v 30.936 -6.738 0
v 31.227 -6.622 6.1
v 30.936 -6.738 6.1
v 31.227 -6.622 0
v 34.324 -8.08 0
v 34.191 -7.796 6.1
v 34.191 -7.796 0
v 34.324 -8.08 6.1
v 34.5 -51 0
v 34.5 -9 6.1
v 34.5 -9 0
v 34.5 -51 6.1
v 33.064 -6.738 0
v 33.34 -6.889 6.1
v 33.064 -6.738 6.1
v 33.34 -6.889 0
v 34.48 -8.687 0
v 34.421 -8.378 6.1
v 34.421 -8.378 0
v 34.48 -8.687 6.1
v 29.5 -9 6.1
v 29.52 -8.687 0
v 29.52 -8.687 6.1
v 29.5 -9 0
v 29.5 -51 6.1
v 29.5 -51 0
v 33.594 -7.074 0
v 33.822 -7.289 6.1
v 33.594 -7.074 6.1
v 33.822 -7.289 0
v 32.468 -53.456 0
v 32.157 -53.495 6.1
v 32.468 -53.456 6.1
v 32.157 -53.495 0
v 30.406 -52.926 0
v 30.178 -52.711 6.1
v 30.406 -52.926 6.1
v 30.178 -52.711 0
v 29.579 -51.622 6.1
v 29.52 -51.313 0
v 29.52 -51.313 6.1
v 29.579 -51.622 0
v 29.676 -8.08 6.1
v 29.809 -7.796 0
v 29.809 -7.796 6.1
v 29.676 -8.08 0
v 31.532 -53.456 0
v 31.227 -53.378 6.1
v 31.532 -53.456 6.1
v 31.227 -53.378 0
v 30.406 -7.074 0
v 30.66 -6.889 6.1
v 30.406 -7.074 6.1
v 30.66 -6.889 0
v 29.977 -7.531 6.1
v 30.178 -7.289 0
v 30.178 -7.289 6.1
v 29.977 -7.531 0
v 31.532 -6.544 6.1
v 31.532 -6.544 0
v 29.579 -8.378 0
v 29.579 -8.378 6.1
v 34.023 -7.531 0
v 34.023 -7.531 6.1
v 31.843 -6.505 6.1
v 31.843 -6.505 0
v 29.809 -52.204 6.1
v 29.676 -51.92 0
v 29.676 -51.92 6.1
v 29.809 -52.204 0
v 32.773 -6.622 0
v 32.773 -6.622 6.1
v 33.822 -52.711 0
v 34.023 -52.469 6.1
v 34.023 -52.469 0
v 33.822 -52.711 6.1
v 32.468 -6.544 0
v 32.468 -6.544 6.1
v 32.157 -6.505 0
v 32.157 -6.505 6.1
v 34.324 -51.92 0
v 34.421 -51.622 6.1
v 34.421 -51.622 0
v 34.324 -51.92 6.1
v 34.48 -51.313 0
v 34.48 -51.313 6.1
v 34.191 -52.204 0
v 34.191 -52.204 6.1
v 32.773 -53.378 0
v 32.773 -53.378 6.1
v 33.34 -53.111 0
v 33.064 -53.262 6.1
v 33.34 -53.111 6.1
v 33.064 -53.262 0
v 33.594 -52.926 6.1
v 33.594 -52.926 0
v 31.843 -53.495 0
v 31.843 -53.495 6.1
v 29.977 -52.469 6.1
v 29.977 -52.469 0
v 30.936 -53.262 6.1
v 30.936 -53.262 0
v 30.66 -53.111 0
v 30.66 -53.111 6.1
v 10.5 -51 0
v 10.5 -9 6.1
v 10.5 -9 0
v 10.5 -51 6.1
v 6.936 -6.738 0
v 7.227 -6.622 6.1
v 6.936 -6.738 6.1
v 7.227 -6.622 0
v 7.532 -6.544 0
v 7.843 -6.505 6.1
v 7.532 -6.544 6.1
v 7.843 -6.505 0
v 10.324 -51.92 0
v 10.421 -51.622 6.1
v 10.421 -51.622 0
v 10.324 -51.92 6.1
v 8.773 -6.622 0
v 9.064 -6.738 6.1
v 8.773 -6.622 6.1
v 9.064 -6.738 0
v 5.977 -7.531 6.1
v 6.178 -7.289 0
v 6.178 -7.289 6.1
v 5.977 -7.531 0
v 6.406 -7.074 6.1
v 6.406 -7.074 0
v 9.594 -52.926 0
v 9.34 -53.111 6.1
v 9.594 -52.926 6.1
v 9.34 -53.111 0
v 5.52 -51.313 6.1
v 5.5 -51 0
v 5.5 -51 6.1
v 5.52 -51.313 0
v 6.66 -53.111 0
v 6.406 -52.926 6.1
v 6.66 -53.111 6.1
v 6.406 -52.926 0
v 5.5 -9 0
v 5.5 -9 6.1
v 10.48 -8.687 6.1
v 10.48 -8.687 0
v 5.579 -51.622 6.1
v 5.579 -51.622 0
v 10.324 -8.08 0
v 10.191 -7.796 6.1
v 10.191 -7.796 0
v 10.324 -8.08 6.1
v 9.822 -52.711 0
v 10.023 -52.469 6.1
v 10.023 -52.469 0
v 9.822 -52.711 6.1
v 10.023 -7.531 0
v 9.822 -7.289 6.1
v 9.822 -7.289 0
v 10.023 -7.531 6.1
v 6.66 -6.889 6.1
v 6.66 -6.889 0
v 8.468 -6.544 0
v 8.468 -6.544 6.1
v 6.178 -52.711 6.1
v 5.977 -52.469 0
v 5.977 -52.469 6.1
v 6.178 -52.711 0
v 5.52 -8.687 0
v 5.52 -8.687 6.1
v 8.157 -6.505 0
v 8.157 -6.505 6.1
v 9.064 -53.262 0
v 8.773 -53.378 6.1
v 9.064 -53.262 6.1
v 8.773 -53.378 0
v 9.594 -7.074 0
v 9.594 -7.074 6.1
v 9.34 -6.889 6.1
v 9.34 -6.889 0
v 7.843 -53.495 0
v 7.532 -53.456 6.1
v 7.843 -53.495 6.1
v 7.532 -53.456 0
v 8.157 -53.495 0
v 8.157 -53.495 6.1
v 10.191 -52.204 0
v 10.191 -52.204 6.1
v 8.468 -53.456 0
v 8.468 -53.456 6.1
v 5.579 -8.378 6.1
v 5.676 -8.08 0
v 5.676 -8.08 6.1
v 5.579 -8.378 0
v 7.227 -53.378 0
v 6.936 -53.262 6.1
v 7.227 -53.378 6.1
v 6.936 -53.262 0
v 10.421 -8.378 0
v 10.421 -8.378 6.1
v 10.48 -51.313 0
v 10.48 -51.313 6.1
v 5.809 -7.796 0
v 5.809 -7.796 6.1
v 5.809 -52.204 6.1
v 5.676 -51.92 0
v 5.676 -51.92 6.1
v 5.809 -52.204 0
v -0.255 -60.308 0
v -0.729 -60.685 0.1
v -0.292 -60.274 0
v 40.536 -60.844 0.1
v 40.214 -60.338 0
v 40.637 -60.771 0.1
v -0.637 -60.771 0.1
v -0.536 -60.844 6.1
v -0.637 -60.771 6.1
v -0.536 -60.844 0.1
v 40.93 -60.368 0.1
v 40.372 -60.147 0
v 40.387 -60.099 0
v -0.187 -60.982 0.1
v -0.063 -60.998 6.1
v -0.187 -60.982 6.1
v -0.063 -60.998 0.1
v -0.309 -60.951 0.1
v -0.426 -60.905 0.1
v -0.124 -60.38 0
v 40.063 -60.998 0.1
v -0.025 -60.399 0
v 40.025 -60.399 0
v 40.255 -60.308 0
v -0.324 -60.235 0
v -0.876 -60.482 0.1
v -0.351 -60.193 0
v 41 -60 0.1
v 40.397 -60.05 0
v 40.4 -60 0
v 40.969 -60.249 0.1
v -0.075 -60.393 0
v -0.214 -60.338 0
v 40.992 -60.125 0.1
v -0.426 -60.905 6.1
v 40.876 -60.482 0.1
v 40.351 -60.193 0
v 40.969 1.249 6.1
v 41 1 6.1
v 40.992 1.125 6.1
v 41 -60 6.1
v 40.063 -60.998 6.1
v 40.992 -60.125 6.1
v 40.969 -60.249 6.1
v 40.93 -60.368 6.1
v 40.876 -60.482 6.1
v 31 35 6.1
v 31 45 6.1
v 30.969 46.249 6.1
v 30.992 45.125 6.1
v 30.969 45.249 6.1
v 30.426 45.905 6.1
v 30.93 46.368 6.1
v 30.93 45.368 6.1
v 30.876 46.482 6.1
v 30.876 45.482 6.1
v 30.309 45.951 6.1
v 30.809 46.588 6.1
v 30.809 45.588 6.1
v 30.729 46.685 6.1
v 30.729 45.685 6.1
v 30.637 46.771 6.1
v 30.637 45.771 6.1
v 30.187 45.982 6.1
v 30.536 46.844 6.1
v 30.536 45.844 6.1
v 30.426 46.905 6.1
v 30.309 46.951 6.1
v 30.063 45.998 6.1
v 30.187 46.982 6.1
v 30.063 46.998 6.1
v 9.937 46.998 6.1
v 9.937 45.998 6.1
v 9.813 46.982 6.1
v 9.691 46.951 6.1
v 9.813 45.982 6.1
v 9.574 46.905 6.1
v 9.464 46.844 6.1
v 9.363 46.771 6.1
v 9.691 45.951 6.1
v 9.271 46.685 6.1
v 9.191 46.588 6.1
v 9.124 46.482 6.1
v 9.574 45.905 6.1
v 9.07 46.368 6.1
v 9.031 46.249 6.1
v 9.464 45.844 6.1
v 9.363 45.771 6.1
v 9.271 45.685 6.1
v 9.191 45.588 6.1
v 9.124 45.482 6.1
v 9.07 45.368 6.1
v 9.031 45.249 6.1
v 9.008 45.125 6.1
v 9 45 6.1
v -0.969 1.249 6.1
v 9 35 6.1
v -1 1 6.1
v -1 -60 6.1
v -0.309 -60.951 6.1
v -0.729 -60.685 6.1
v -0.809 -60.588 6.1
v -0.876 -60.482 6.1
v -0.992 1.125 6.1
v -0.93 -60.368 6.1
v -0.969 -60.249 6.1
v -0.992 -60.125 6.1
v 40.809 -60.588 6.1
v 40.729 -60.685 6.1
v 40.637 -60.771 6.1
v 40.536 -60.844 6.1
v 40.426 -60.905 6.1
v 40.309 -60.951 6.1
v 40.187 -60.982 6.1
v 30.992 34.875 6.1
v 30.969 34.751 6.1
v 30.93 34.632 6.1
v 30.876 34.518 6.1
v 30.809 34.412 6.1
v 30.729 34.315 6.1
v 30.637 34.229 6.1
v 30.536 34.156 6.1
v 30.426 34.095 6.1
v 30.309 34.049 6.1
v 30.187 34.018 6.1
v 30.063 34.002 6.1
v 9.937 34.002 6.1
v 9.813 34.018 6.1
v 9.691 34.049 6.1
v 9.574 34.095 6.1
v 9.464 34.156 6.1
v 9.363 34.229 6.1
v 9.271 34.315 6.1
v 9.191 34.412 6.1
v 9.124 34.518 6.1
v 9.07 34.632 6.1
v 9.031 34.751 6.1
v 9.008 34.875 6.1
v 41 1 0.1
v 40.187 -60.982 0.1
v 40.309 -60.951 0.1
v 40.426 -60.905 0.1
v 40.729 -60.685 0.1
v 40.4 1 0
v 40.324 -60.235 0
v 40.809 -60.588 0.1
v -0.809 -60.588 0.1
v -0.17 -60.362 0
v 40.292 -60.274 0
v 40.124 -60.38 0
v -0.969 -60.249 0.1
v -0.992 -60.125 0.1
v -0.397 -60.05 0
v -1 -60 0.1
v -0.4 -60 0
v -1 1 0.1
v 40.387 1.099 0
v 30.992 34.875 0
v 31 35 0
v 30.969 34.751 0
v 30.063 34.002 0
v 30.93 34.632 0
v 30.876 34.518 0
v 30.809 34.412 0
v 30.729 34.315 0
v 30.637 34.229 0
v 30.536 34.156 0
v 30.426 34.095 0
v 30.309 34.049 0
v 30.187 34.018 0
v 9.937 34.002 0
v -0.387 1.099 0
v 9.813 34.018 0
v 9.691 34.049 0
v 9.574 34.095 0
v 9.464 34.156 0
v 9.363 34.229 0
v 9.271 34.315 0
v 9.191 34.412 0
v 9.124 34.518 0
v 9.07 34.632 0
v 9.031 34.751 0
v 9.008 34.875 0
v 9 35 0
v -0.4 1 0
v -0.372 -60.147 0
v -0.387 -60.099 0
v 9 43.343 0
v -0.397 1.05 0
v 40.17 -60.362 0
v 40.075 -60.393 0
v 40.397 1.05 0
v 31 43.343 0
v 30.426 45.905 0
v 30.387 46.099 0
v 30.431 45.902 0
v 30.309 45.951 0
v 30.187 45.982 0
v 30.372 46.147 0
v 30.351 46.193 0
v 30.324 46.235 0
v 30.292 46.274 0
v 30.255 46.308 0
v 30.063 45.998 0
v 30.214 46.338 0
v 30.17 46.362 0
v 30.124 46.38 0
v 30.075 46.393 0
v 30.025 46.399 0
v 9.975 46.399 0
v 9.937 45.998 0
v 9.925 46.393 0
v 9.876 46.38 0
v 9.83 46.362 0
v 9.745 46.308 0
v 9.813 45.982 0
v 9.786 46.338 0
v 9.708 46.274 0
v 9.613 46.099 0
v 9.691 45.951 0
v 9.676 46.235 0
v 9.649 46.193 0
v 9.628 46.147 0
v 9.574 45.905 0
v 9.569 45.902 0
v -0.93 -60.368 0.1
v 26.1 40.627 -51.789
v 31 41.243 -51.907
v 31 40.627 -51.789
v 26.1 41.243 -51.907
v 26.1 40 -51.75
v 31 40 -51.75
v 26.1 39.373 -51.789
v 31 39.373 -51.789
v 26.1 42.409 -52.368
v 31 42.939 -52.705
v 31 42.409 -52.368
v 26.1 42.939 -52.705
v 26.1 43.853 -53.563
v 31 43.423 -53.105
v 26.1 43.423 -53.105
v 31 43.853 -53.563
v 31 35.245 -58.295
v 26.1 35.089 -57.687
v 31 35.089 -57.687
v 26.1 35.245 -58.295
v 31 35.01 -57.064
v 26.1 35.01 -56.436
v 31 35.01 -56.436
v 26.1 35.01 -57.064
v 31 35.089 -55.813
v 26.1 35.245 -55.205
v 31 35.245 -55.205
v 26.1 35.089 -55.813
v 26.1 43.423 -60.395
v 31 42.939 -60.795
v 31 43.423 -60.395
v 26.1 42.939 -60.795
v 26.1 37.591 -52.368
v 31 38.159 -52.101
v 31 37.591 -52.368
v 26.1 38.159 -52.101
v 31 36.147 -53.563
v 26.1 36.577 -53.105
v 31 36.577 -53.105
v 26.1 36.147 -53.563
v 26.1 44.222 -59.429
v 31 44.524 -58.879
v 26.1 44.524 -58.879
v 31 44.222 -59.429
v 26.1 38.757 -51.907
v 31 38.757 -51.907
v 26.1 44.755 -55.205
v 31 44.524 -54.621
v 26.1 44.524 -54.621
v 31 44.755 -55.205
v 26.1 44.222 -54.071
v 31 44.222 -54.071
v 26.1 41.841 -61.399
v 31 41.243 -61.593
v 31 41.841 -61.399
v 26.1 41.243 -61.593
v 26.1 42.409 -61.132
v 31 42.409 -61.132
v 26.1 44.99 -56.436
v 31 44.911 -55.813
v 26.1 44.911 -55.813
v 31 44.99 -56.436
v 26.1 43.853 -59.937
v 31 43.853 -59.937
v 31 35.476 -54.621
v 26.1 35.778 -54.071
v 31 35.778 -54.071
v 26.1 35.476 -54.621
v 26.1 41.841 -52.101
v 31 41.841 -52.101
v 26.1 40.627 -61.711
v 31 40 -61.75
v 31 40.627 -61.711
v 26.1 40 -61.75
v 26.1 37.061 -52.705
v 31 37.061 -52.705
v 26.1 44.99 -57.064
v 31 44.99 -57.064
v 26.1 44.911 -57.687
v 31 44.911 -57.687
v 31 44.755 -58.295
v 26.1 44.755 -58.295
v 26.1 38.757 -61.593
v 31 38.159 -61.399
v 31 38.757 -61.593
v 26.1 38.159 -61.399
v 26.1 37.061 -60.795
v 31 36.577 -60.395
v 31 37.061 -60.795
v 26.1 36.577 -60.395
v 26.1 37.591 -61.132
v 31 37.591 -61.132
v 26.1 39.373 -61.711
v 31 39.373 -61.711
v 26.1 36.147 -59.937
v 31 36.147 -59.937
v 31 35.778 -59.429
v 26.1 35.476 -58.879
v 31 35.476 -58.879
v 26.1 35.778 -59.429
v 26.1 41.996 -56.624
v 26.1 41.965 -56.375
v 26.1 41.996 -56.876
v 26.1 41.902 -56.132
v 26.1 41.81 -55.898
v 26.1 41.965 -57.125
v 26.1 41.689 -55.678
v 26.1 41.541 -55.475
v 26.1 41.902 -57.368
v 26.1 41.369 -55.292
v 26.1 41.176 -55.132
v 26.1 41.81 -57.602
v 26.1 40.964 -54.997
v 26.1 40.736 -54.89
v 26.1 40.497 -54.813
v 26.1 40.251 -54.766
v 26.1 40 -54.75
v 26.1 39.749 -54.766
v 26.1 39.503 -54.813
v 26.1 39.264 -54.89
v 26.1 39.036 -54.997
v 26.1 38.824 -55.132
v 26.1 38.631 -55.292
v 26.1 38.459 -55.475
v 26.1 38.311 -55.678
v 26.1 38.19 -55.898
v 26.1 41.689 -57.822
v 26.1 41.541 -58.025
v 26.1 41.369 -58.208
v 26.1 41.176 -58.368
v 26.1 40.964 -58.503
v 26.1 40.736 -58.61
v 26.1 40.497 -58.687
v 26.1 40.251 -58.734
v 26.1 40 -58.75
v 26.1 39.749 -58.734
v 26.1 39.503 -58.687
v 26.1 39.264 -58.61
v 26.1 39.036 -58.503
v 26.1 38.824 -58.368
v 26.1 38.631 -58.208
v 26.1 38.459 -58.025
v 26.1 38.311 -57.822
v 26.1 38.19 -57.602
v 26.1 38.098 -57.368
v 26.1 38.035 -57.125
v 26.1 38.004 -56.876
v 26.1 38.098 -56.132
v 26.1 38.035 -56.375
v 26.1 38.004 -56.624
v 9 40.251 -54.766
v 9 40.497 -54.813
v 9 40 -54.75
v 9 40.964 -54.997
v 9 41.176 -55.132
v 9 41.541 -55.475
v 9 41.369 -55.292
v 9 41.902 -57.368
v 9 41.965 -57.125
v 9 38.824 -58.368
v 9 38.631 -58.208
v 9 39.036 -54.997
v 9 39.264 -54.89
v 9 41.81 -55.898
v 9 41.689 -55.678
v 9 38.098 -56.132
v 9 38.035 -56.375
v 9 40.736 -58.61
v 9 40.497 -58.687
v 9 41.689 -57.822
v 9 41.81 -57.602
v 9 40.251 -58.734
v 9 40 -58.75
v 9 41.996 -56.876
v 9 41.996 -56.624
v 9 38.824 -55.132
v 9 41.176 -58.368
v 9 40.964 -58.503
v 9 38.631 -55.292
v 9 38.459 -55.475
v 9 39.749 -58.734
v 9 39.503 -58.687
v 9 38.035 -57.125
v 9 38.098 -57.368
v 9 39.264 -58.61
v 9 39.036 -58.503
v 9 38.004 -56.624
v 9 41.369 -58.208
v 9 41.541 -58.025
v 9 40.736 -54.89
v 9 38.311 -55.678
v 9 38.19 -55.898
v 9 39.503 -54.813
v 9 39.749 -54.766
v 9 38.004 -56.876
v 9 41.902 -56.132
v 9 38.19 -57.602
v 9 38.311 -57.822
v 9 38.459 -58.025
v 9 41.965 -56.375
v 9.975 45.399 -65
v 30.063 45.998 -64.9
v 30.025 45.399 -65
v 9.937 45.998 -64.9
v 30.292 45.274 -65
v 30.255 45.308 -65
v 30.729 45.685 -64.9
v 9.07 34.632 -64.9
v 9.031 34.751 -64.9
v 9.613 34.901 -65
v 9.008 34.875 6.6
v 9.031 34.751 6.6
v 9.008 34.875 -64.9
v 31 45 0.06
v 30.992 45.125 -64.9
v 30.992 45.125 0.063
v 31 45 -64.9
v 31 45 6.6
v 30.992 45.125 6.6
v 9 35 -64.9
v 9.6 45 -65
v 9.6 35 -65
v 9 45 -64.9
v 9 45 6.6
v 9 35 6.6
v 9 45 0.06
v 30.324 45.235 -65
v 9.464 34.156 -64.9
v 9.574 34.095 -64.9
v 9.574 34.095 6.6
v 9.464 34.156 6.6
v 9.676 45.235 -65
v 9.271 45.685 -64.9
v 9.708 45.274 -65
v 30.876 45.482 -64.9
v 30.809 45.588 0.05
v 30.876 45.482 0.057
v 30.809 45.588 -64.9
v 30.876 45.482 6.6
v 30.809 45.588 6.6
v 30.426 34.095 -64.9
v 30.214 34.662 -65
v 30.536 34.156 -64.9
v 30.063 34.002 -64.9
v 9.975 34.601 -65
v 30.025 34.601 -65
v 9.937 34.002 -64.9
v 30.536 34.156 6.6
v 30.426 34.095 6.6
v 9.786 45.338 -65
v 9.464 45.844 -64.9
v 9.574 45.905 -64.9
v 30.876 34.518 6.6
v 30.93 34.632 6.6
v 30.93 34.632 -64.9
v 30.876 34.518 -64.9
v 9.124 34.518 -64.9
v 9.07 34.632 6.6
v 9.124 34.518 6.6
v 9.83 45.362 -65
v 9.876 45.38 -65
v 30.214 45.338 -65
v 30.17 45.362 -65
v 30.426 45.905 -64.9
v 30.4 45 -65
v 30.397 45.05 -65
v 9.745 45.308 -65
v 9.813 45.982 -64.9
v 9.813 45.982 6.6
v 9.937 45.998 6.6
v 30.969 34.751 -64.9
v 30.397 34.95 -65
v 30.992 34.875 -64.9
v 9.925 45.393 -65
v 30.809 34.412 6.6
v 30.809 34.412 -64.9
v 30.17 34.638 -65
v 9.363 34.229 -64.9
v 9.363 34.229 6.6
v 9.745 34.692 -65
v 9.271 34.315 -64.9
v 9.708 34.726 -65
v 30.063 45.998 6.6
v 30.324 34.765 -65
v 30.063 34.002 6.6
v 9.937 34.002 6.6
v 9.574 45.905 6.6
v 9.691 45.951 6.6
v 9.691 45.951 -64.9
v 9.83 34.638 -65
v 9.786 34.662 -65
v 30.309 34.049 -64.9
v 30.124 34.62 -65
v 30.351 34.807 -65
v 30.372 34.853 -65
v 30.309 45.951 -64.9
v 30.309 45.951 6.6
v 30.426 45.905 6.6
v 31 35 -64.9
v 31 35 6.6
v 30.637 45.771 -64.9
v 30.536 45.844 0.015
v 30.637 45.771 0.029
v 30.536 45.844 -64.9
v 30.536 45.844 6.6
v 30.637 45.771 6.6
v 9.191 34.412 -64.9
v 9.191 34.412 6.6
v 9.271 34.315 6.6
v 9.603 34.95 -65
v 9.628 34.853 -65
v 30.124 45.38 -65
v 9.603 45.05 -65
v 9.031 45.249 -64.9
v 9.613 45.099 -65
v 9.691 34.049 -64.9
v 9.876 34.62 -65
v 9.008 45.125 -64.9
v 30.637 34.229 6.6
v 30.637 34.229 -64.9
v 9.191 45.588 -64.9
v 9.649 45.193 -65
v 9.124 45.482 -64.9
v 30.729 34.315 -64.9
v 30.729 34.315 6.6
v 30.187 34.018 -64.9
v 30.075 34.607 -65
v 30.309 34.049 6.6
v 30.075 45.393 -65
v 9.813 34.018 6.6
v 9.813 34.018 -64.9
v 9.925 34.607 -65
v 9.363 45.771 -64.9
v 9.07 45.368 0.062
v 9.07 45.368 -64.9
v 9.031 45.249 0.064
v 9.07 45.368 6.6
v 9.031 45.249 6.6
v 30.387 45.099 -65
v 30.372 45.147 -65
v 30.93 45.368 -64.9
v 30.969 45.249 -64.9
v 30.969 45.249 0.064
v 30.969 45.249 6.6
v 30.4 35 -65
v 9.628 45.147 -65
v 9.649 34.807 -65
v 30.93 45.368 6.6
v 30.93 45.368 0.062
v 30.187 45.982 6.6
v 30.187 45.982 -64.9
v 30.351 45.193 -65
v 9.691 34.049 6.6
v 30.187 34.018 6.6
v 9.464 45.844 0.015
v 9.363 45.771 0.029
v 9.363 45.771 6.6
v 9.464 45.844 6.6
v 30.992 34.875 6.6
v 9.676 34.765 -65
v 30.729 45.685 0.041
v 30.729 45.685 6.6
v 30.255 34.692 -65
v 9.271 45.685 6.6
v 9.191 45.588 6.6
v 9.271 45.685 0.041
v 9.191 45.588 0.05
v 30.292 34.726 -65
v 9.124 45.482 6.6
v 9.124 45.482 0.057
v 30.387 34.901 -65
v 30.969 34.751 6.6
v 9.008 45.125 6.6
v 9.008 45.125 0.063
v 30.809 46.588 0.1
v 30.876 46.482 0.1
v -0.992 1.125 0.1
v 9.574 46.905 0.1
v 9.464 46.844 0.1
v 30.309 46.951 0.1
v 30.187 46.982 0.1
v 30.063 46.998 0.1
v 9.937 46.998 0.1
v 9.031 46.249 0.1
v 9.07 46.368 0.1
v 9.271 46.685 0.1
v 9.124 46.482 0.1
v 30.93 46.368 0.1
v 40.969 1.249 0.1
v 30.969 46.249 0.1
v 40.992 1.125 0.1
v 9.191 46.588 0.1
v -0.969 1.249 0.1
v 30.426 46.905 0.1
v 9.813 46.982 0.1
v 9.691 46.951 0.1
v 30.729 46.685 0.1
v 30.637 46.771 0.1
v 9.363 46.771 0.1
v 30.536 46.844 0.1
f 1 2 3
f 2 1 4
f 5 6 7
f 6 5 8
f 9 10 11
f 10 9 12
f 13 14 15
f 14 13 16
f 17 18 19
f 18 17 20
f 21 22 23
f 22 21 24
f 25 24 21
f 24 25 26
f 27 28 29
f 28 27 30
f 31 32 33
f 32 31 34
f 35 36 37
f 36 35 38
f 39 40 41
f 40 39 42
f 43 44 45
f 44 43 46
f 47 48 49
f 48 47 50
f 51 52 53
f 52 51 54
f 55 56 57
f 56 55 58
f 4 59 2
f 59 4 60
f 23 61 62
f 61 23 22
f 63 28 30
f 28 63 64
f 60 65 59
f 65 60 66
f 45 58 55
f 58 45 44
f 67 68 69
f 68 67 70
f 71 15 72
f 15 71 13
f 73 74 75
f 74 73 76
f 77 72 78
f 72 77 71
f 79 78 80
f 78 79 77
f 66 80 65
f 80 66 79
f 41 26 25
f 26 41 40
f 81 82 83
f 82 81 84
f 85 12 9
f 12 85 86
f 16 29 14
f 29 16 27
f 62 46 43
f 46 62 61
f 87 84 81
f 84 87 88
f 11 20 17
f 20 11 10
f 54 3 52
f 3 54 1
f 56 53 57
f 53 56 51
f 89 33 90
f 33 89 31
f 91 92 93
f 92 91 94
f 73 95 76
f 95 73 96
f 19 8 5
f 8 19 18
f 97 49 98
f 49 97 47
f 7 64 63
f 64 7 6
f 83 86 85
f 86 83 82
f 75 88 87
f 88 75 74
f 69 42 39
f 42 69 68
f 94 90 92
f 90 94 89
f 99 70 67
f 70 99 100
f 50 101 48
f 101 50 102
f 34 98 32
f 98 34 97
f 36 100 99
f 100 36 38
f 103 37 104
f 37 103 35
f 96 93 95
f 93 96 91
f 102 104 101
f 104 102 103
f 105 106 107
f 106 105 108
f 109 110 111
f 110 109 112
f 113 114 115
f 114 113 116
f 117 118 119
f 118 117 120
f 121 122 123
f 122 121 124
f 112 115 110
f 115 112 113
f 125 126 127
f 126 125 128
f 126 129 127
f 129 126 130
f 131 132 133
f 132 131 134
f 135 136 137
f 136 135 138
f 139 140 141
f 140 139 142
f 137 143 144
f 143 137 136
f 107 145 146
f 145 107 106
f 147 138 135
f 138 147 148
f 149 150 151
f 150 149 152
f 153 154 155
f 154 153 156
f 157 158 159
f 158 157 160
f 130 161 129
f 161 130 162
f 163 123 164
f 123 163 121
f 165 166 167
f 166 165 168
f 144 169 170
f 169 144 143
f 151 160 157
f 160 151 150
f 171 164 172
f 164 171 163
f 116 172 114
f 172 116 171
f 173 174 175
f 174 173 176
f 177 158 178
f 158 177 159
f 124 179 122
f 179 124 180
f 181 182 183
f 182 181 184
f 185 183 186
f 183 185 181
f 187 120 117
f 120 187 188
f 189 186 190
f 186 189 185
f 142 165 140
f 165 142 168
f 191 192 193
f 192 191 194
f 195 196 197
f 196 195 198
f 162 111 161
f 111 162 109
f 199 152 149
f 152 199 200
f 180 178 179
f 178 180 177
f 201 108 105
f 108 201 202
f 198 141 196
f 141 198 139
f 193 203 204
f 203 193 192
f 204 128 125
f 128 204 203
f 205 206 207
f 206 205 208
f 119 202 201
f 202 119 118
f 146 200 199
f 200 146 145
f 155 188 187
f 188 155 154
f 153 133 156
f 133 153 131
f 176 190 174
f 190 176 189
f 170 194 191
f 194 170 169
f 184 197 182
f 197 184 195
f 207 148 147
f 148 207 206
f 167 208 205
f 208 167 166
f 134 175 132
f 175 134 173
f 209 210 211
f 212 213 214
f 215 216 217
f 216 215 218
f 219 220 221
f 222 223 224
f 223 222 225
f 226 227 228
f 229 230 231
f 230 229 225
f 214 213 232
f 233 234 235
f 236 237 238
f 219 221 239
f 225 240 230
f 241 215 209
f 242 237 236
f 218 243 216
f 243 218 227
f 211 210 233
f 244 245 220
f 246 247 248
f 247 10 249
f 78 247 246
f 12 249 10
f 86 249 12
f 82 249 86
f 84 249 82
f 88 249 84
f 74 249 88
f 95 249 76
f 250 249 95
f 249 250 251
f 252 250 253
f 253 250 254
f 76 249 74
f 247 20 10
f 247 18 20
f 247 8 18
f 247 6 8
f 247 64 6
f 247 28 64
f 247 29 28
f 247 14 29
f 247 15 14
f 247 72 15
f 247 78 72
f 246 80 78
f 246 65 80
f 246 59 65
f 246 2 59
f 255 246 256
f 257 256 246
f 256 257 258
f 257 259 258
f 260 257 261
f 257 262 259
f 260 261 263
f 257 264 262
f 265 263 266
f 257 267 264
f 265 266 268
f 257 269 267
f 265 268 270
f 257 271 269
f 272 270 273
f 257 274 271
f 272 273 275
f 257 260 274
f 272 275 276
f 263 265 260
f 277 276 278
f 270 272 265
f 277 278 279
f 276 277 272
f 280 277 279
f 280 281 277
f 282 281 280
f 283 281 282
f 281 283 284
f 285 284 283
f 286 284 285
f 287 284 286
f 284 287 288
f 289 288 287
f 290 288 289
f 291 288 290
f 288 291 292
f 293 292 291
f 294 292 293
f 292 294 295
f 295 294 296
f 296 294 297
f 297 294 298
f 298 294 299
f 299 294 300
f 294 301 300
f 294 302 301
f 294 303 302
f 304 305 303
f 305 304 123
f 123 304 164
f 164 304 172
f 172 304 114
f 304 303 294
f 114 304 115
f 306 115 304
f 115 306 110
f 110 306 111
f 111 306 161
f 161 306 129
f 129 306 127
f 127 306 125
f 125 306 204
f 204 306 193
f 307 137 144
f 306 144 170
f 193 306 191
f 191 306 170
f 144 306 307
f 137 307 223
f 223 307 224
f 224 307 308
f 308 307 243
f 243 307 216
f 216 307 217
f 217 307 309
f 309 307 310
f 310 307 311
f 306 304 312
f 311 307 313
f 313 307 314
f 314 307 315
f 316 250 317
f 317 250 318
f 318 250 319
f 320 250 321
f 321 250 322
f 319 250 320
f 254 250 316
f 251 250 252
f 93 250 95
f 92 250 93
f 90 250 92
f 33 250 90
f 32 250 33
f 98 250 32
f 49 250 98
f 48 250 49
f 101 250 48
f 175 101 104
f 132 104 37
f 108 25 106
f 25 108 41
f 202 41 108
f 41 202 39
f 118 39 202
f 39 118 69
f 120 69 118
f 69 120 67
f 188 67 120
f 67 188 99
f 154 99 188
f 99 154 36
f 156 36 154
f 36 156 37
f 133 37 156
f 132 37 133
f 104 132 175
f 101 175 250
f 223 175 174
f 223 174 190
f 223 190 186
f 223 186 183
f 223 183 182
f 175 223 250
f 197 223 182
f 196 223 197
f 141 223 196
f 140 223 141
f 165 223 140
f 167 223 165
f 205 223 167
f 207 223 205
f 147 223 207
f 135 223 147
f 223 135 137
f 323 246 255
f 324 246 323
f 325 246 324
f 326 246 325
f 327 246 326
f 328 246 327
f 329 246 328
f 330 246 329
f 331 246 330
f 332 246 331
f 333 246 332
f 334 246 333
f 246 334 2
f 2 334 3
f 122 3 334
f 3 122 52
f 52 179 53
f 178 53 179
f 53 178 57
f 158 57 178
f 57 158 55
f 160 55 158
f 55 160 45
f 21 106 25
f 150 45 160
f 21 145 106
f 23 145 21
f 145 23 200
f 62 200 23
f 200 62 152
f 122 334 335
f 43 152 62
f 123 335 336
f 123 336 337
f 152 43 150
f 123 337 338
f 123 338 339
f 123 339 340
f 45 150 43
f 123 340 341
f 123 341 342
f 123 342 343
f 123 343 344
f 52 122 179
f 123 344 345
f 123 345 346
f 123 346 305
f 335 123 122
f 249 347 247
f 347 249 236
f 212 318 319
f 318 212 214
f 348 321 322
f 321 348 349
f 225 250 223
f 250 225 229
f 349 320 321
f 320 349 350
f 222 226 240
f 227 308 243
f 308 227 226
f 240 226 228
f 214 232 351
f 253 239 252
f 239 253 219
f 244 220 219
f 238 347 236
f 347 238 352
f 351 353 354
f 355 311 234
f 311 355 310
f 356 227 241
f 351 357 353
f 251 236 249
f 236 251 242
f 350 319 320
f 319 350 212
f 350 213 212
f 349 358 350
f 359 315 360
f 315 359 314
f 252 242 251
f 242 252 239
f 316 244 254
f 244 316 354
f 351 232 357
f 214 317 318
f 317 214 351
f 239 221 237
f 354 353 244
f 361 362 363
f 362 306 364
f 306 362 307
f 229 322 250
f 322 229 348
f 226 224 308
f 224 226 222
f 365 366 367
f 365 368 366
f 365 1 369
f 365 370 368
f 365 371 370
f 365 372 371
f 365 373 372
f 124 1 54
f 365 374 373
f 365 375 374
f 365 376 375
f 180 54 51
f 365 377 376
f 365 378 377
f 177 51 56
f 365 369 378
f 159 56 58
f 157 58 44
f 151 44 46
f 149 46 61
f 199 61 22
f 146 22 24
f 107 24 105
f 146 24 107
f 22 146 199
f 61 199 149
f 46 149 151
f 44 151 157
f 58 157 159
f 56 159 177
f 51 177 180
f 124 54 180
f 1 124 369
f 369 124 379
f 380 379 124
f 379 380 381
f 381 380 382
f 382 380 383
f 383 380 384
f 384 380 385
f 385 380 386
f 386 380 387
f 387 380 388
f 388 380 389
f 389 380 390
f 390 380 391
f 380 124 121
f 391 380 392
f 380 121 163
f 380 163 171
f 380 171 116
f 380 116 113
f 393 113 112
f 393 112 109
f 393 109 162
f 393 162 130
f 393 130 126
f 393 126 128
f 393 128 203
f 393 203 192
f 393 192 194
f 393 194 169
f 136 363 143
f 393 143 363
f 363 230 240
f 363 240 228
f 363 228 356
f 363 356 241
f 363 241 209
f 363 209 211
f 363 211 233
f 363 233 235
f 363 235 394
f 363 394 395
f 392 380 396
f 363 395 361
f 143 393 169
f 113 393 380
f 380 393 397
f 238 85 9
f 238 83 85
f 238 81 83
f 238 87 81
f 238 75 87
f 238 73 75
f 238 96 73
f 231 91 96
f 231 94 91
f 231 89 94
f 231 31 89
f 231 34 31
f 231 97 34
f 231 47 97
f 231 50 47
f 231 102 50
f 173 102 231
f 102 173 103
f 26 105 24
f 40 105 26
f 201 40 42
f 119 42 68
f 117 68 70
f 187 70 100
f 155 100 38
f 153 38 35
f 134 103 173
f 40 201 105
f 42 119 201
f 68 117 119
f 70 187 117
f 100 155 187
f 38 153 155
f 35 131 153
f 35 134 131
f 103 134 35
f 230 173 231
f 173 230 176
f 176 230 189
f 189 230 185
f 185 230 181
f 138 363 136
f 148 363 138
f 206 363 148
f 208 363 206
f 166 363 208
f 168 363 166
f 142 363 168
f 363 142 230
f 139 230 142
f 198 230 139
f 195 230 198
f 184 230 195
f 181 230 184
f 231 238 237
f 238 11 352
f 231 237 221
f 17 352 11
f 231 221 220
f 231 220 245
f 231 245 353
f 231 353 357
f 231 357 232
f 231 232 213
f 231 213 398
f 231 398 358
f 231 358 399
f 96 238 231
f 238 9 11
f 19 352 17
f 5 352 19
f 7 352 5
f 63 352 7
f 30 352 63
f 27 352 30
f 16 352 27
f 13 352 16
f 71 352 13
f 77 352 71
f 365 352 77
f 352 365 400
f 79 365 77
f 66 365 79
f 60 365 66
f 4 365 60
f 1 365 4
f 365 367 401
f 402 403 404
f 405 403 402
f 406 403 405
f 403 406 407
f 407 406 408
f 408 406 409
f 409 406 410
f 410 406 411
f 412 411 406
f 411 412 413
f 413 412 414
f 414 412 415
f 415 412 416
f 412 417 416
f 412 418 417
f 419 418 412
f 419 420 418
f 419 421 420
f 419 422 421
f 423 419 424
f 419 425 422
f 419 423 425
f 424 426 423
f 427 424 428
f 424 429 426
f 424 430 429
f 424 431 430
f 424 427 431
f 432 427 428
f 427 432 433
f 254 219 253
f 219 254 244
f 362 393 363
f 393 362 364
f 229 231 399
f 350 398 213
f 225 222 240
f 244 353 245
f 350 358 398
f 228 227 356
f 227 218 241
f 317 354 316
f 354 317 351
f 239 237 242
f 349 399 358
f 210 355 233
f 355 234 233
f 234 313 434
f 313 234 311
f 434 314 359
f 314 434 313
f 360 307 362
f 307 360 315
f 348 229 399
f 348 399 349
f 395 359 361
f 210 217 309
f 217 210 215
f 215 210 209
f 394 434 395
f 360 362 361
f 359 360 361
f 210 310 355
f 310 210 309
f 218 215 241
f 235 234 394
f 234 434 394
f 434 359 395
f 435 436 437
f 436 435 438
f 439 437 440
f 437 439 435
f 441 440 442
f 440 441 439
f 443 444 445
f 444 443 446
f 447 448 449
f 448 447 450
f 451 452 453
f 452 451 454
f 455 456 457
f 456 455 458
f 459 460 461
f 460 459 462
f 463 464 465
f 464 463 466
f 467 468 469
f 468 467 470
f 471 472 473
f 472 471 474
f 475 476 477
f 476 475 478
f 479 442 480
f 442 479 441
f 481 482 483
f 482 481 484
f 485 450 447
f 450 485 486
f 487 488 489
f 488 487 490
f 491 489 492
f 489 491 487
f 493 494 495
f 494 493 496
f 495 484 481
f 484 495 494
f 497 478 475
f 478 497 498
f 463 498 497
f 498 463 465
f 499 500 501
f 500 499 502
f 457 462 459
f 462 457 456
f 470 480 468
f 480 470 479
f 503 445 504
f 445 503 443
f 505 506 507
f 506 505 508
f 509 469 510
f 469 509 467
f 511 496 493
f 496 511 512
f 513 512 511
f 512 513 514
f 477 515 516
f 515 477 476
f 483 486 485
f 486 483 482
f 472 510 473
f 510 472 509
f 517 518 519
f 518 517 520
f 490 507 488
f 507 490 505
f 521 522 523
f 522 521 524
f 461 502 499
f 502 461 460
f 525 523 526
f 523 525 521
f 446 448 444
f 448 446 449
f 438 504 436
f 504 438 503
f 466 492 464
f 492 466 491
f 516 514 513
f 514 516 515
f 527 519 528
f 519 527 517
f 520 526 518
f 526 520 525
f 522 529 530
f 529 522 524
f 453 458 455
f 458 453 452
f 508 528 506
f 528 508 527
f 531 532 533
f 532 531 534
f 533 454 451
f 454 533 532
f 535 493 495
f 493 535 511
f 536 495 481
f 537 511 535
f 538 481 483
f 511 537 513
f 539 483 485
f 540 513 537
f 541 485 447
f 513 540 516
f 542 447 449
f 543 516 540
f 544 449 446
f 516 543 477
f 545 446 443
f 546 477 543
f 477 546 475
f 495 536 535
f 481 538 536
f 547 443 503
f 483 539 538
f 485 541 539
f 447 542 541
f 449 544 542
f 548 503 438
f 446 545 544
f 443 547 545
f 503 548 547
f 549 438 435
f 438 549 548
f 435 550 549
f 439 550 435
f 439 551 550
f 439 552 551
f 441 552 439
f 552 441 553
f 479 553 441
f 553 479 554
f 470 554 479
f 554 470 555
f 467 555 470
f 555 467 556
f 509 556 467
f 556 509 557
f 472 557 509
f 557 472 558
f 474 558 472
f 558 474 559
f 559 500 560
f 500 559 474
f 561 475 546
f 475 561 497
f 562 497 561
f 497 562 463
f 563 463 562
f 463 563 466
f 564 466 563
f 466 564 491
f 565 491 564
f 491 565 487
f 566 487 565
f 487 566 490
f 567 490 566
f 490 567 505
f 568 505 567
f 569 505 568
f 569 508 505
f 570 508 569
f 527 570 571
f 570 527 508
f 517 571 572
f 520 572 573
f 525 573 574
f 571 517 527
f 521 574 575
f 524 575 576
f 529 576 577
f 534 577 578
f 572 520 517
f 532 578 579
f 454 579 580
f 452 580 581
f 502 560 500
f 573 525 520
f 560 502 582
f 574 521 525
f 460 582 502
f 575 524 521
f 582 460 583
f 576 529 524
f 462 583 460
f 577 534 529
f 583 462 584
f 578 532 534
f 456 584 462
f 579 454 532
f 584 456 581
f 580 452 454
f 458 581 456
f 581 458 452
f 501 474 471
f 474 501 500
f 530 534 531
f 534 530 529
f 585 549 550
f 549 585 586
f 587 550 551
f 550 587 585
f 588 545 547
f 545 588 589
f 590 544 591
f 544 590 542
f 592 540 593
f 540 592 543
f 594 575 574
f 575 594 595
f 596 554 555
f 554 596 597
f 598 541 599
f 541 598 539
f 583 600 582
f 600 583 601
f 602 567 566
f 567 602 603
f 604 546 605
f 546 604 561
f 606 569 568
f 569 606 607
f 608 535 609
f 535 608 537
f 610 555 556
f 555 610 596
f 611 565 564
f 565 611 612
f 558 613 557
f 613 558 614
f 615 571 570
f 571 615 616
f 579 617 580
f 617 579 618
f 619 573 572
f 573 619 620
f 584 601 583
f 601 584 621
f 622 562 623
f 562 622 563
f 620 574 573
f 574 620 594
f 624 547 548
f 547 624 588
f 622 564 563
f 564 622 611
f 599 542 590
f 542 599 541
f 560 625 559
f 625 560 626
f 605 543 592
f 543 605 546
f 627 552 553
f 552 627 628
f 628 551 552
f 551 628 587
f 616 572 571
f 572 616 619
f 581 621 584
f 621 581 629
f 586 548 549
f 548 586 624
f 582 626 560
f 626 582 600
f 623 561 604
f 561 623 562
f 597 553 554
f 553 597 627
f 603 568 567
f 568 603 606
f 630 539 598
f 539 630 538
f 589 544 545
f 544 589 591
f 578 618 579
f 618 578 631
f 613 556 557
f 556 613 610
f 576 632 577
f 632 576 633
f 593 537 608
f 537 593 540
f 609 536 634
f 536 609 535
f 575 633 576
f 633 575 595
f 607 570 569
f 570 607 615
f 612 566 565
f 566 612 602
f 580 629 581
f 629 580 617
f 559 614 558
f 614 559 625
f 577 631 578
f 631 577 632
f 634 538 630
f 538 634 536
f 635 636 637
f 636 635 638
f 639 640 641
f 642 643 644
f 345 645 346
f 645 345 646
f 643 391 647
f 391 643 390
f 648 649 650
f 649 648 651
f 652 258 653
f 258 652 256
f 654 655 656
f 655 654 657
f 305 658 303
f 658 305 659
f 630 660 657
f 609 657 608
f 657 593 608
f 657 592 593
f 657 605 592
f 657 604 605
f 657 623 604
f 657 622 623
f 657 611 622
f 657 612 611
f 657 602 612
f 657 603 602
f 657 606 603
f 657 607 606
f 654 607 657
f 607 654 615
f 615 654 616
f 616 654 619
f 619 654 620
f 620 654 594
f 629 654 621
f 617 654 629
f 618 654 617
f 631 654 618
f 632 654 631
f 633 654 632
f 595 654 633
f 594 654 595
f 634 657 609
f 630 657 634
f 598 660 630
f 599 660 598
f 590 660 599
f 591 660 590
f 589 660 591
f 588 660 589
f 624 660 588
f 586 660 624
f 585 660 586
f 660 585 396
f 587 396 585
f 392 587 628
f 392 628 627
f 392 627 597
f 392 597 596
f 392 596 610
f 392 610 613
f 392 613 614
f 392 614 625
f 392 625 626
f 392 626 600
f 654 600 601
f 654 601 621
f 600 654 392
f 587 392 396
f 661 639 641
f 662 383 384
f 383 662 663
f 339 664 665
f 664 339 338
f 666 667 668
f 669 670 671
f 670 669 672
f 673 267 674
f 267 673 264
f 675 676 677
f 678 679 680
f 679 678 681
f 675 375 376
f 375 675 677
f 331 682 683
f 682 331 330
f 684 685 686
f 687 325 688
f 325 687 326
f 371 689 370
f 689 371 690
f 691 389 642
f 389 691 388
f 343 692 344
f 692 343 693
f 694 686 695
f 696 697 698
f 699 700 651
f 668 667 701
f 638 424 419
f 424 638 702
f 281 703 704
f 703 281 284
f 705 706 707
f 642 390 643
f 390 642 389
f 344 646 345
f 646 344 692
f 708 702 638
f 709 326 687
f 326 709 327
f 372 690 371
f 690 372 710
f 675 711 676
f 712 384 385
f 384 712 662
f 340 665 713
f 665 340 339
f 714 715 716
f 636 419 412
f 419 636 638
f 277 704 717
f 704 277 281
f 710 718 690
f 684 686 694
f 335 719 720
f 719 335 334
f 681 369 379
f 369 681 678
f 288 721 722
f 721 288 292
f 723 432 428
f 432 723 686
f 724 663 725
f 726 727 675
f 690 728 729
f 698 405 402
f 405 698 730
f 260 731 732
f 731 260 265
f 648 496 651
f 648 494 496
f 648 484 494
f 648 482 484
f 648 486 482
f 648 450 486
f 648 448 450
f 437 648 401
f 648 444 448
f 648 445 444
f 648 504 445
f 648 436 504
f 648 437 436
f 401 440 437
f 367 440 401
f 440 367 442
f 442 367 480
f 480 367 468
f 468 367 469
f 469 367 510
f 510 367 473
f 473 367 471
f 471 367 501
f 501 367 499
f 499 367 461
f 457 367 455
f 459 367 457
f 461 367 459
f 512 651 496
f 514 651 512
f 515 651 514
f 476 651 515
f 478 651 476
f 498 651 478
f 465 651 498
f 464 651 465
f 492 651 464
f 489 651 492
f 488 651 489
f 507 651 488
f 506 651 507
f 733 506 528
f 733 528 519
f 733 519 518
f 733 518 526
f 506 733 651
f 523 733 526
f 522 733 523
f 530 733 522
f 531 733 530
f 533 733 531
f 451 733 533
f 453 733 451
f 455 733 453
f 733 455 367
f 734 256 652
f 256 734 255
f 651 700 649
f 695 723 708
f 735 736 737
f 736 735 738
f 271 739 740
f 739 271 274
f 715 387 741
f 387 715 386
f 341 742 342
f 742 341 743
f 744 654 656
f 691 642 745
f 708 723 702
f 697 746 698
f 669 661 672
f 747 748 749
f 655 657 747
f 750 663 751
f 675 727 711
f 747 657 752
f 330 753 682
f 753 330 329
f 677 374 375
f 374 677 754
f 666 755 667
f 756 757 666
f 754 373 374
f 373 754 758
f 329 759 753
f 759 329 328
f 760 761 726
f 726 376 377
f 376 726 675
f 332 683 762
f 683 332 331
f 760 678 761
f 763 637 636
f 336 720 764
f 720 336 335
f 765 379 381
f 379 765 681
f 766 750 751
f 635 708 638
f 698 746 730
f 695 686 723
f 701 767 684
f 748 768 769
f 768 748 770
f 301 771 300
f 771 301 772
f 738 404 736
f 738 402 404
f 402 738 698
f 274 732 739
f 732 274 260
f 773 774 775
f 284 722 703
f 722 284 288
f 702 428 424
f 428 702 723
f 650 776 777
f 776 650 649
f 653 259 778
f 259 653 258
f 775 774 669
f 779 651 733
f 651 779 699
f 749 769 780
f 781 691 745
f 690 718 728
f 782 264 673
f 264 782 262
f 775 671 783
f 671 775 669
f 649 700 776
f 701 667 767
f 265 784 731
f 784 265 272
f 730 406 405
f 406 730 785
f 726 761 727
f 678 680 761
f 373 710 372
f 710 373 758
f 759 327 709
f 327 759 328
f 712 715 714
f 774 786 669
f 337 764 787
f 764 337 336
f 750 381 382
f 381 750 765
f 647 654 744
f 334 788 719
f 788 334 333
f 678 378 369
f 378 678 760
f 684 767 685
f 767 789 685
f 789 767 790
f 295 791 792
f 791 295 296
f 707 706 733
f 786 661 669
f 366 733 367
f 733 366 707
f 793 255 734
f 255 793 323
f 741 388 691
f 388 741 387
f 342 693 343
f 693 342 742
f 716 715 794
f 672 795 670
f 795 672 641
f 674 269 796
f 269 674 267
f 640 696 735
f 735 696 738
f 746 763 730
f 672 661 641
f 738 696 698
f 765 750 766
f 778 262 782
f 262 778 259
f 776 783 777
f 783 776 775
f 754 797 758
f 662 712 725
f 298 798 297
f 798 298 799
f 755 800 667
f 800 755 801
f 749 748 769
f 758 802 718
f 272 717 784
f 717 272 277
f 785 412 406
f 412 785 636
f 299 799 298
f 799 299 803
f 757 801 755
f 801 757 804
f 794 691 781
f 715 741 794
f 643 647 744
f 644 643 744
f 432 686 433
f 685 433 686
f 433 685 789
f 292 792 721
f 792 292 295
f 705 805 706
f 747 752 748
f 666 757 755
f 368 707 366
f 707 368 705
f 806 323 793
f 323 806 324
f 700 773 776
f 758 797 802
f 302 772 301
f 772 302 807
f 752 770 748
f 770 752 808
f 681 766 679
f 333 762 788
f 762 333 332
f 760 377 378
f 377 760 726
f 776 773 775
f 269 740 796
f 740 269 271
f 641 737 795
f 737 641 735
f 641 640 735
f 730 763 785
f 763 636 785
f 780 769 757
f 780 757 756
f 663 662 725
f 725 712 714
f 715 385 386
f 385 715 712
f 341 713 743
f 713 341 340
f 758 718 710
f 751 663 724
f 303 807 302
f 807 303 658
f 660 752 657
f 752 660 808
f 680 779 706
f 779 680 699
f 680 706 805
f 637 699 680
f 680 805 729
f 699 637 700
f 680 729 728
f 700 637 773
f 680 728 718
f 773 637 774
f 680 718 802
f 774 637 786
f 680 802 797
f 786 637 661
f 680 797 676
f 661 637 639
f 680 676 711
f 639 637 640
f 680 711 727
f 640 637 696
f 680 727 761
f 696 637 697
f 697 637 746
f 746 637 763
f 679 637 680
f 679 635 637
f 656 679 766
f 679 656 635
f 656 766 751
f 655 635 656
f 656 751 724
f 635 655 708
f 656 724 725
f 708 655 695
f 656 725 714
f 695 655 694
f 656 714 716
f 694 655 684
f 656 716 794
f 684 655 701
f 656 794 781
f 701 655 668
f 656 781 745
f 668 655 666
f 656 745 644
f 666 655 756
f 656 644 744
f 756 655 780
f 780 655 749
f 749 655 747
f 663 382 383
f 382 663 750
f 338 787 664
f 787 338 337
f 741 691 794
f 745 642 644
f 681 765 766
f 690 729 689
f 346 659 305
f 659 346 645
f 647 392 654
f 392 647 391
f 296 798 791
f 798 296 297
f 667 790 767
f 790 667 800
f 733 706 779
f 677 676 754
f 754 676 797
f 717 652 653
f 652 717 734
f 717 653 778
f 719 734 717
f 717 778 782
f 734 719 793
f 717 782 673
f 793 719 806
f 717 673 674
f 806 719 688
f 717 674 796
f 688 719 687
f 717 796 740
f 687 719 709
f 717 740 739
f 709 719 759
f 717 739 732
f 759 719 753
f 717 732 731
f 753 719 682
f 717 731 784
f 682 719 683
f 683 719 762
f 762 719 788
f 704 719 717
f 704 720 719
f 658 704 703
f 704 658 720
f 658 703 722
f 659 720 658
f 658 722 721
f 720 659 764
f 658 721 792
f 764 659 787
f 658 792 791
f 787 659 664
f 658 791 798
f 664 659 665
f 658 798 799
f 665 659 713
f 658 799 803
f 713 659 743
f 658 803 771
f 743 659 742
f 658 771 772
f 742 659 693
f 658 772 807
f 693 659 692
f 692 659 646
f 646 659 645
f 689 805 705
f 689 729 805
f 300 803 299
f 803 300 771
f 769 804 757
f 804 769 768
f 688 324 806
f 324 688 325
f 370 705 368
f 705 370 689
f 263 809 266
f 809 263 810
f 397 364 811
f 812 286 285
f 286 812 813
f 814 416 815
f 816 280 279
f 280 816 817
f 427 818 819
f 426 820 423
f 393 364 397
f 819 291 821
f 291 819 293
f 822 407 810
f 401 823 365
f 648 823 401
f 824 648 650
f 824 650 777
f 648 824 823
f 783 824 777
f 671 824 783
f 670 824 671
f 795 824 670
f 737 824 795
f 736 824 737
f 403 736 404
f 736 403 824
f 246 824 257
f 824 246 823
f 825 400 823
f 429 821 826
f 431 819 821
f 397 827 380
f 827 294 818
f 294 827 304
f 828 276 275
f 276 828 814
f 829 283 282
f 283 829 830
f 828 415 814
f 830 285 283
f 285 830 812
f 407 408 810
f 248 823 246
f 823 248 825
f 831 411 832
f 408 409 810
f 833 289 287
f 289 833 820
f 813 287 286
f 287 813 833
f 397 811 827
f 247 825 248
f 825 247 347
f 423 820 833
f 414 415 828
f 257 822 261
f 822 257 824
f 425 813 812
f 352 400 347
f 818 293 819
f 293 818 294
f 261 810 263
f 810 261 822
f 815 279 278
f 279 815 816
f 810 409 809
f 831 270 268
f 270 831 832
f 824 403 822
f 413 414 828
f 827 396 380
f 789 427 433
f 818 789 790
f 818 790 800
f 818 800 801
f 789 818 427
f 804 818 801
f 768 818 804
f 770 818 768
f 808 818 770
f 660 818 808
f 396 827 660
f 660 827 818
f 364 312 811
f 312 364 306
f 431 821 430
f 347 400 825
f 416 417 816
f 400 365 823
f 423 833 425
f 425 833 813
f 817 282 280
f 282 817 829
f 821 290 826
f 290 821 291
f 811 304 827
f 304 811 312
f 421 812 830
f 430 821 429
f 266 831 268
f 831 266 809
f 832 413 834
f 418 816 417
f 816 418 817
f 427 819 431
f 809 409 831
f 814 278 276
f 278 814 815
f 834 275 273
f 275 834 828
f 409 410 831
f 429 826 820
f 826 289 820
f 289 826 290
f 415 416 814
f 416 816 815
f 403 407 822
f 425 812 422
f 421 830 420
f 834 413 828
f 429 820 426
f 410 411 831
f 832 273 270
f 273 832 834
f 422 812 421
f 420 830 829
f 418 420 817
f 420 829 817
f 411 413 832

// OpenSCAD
// file: util.scad
module rounded_cube(c=[1,1,1], r=0.1, h=0.4) {
    minkowski(){
      cube(c);
      cylinder(r,h);
    }
}

module half_cylinder(h=1, r=1) {
 intersection() {
     translate([0, -r, 0]) cube([r*2,r*2,h]);
     cylinder(r=r, h=h);
 }   
}

module halfSphere(r=1) {
 intersection() {
     translate([0, -r, -r]) cube([r*2,r*2,r*2]);
     sphere(r=r);
 }   
}

module pin(h=1) {
    hull(){
        cylinder(h=0.1,r=h/2);
        translate([0,0,h]) sphere(r=0.1);
    }
}

module hollow_cylinder(h=1, r=1, shell=0.1) {
    s = 1 - shell;
    difference() {
        cylinder(h=h,r=r);
        translate([0,0,-0.5]) cylinder(h=h+1,r=r*s);
    }
}

module cube_minus_sphere(size=1) {
    difference() {
       translate([-size/2,0.1,-size/2]) cube([size,size/2,size]);
       rotate([0,0,90]) halfSphere(r=size/2);
    }
}

module curve_cube(c=[1,1,1], curve=0.5) {
    difference() {
        rounded_cube(c);
        scale([1, 1, curve]) 
            translate([-1.5,c[1]/2,-c[1]/8]) 
                rotate([0,90,0]) 
                    cylinder(h=c[0]+3,r=c[1]/1.8);
    }    
}
module hook(h=5, d=3) {
    $fn=100;
    cylinder(h,d=d);
    translate([0,0,h]) sphere(d=d);
    
}

module cone(startDia=5, endDia=1, h=5) {
    $fn=200;
    hull() {
        cylinder(h=0.1, d=startDia);
        translate([0,0,endDia]) cylinder(h, d=endDia);
    }
}


module flexScrewHole(screwLength=10, screwDia=5, stretch=10, center=true ) {
    centerX = center ? -stretch/2 : 0;
    translate([centerX,0,0]){
        hull() {
            cylinder(h=screwLength, d=screwDia);
            translate([stretch,0,0]) cylinder(h=screwLength, d=screwDia);
        }
    }
}

module nut() {
    $fn=6;
    cylinder(d=TC_SCREW_NUT_DIA, h=TC_SCREW_NUT_HEIGHT);   
}

module hollow_rounded_cube(c=[1,1,1], shell=2.5, center=true) {
    //center
    centerX = center ? -c[0]/2 : 0;
    centerY = center ? -c[1]/2 : 0;
    translate([centerX,centerY, 0]) {
    
    difference() { 
        rounded_cube(c,0.1, 0.4);
        //inner
        translate([shell/2,shell/2,-.1]) {
            rounded_cube([c[0]-shell,c[1]-shell,c[2]+1],0.1, 0.4);
        }
    }
}
}

module triangle(size=100, height=10) {
 linear_extrude(height=height) polygon(points=[[0,0],[size,0],[0,size]], paths=[[0,1,2]]);
}
// file: startup.scad
include <util.scad>;

$fn =50;

//Aluminuim profile 3030
ALUMINUM_SIZE=30;

// carraige mount
CARRAGE_MOUNT_X=35;
CARRAGE_MOUNT_Y=65;
CARRAGE_MOUNT_Z=7;
TOOL_CHANGER_Z=7;

//size
CMS =
[CARRAGE_MOUNT_X,
CARRAGE_MOUNT_Y,
CARRAGE_MOUNT_Z];

// tool changer
toolChangerSize = 
[CARRAGE_MOUNT_X,
CARRAGE_MOUNT_Y,
TOOL_CHANGER_Z];

// tool catcher
TC_BASE_X=ALUMINUM_SIZE;
TC_BASE_Y=5;
TC_BASE_Z=20;
TC_BASE=[TC_BASE_X,TC_BASE_Y,TC_BASE_Z];


//locking in location small rods
RODS_HEIGHT=9;   // real heigt is 12
RODS_DIA=3.5;
RODS_FROM_X_FRONT=6;
RODS_FROM_Y_FRONT=20;
RODS_DISTANCE_FRONT=24;

// HOOKS
HOOKS_HEIGT=6;
HOOKS_DIA=6;

//magnets
MAGNET_DIA=12.5;
MAGNET_HEIGHT=5.5;
MAGNET_DISTANCE=30;

//new magnets
MAGNET_NEW_DIA=20;
MAGNET_NEW_HEIGHT=6;

//Brass Knurl screw
BRASS_KNURL_SCREW_DIA=5;
BRASS_KNURL_SCREW_HEIGHT=5;

//V6 HOT END
v6_DIA=16;
v6_DIA_HEIGHT_DOWN=3;
v6_DIA_HEIGHT_UP=3.7;
v6_INNER_DIA=12;
v6_INNER_HEIGHT=6;

v6_MOUNT_HEIGHT=v6_DIA_HEIGHT_DOWN + v6_INNER_HEIGHT + v6_DIA_HEIGHT_UP - .2;
v6_MOUNT_WIDTH=20;

v6_SECOND_PART_WIDTH=11;

//tool change
TC_SCREW_DISTANCE = 55;
TC_SCREW_LENGTH = 25;
TC_SCREW_HEAD_HEIGHT = 5;
TC_SCREW_HEAD_DIA = 10;
TC_SCREW_DIA = 4;

//nut 
TC_SCREW_NUT_DIA = 8;
TC_SCREW_NUT_HEIGHT = 4;


//tool catcher
TOOL_CATHCER_SCREWS_DISTANCE = ALUMINUM_SIZE/2;

//plastic tie 
PLASTIC_TIE_HEIGHT = 2.2;
PLASTIC_TIE_DEPTH = 3;

//fan mount
FAN_MOUNT_DISTANCE=20;
FAN_MOUNT_TUBE_DIA=5;


module toolChangeScrew() {
//top
cylinder (h=TC_SCREW_HEAD_HEIGHT, d=TC_SCREW_HEAD_DIA);
//body
translate([0,0,TC_SCREW_HEAD_HEIGHT -.1])
cylinder (h=TC_SCREW_LENGTH, d=TC_SCREW_DIA);    
}

module toolChangeScrews(right=true, center=true) {
    r = right ? 180 : 0;
    c = center ? -TC_SCREW_DISTANCE/2 : 0;
    translate([c,0,0]) {
        rotate([r,0,0]) {
            toolChangeScrew();
            translate([TC_SCREW_DISTANCE,0,0])
                toolChangeScrew();
        }
  }
}

module toolChangeScrewsWithNut(right=true, center=true) {
    toolChangeScrews(right, center);
    c = center ? -TC_SCREW_DISTANCE/2 : 0;
    r = right ? -TC_SCREW_LENGTH : TC_SCREW_LENGTH;
    translate([c,0,0]) {
      translate([0,0, r]) nut();
      translate([TC_SCREW_DISTANCE,0,r]) nut();
    }
    
    
}

module M3Screw(length=10) {
    //top
    cylinder (h=3, d=5.5);
    //body
    translate([0,0,3 -.1])
    cylinder (h=length, d=3);
}

module M5Screw(length=10) {
    //top
    cylinder (h=5, d=9);
    //body
    translate([0,0,5 -.1])
    cylinder (h=length, d=5);
}

module brassKnurlScrew() {
    cylinder (h=BRASS_KNURL_SCREW_HEIGHT, d=BRASS_KNURL_SCREW_DIA);
}


module magnet(h=MAGNET_HEIGHT, d=MAGNET_DIA) {
    cylinder (h=MAGNET_HEIGHT, d=MAGNET_DIA);
}

module small_rods_relative(distanceBetweenRodsX=10, distanceBetweenRodsY=10 ,centerRode=true) {
    //up right
    cylinder(h=RODS_HEIGHT, d=RODS_DIA);
    //up left
    translate([distanceBetweenRodsX,0,0])
      cylinder(h=RODS_HEIGHT, d=RODS_DIA);
    //down right
    translate([0,distanceBetweenRodsY,0])
      cylinder(h=RODS_HEIGHT, d=RODS_DIA);
    //down left
    translate([distanceBetweenRodsX,distanceBetweenRodsY,0])
      cylinder(h=RODS_HEIGHT, d=RODS_DIA);
    if(centerRode){
    //center
    translate([distanceBetweenRodsX/2,distanceBetweenRodsY/2,0])
      cylinder(h=RODS_HEIGHT, d=RODS_DIA);
    }
}

module small_hooks_relative(distanceBetweenHooksX=10, distanceBetweenHooksY=10, hooksScale=1) {
    //up right
    scale(hooksScale) hook(h=HOOKS_HEIGT, d=HOOKS_DIA);
    //up left
    translate([distanceBetweenHooksX,0,0])
      scale(hooksScale) hook(h=HOOKS_HEIGT, d=HOOKS_DIA);
    //down right
    translate([0,distanceBetweenHooksY,0])
      scale(hooksScale) hook(h=HOOKS_HEIGT, d=HOOKS_DIA);
    //down left
    translate([distanceBetweenHooksX,distanceBetweenHooksY,0])
      scale(hooksScale) hook(h=HOOKS_HEIGT, d=HOOKS_DIA);
}

module magnetsRelative(distanceBetweenMagnet=15, center=true) {
    
    c = center ? 0 : -distanceBetweenMagnet/2 ;
    translate([c, 0,0 ]){
    
      //up center
      translate ([distanceBetweenMagnet/2, 0,0]) magnet();    
      //translate ([distanceBetweenMagnetX, distanceBetweenMagnetY,0])
       // magnet();
      translate ([-distanceBetweenMagnet/2, 0,0])
        magnet();
    }
}


module tieHole(tieSize=3, depth=10) {
   rotate_extrude(angle=180, $fn=100)
       translate([depth, 0]) circle(tieSize);   
}

module M3nut() {
    $fn=6;
    cylinder(d=6, h=3);
}

module newMagnet() {
    $fn=400;
    cylinder(h=MAGNET_NEW_HEIGHT, d=MAGNET_NEW_DIA);
}

module toolChangerScrewGate() {
    cone(TC_SCREW_DIA+1.5, TC_SCREW_DIA, 2);
}
// main file
include <startup.scad>;
include <util.scad>;

X = TC_SCREW_HEAD_DIA*2;
Y = TC_SCREW_HEAD_HEIGHT*2;
Z = TC_SCREW_DISTANCE*1.3;

M5=5;

TC_BASE3_X = 40;
TC_BASE3_Y = ALUMINUM_SIZE*2;
TC_BASE3_Z = 6;
TC_BASE3=[TC_BASE3_X,TC_BASE3_Y,TC_BASE3_Z];
module base(){
    rounded_cube(TC_BASE3,0.1, 0.4);
}

module profileMount(){
    difference() {
        rounded_cube(TC_BASE3,0.1, 0.4);
        translate([TC_BASE3_X/2, TC_BASE3_Y/2,-0.1]) {
            translate([TC_BASE3_X*0.3, 0,0]) screwsHolderLocation(distance=TC_BASE3_Y*0.7, diameter=M5);
            translate([-TC_BASE3_X*0.3, 0,0]) screwsHolderLocation(distance=TC_BASE3_Y*0.7, diameter=M5);
        }
        
    }
}
/*
module M5screwsHolderLocation(center=true) {
    centerX = -TC_BASE3_X/2;
    centerY = -TC_BASE3_Y/2 + TC_BASE_Y/2 ;
    screwLength = TC_BASE_Y+3;
    translate([centerX,centerY,0])  {
        hull() {
            translate([0,0,(TC_BASE3_Z/2)*0.8]) 
                rotate([90,0,0]) cylinder(h=screwLength, d=5);
            translate([0,0,-(TC_BASE3_Z/2)*0.3])
                rotate([90,0,0]) cylinder(h=screwLength,d=5);
        }
    }
}
*/
module screwsHolderLocation(distance=TC_BASE3_Y, diameter=5) {
    screwLength = TC_BASE3_Z+3;
    translate([0,-distance/2,0]){
hull() {
            cylinder(h=screwLength, d=diameter);
        translate([0,distance,0])
            cylinder(h=screwLength,d=diameter);
        }
    } 
}



module catcherScrews(right=false) {
    translateX = right ? -1.1 : X+1.1;
    difference() {
        rounded_cube([X,Y,Z],0.1, 0.4);
        translate([translateX ,Y/2,Z/2]) rotate([0,-90,0]) toolChangeScrewsWithNut(right);
    }
}

module toolChangerCathcer3(right=false) {
    translate([0,-TC_BASE3_Y,0]) profileMount();
   hull() {
        rounded_cube([TC_BASE3_X ,1,TC_BASE3_Z ],0.1, 0.4);
       
       translate([TC_BASE3_X/2 - X/2,45,0])
       rounded_cube([X,1,TC_BASE3_Z ],0.1, 0.4);
    }
    
   translate([TC_BASE3_X/2 - X/2,35,0]){
       translate([0,0,-15]) rounded_cube([X,Y,15],0.1, 0.4);
      translate([0,0,-65]) 
       catcherScrews(right);
       
       }
}
//linear_extrude(height = 0.6) projection(cut=false)
toolChangerCathcer3();

//profileMount();
